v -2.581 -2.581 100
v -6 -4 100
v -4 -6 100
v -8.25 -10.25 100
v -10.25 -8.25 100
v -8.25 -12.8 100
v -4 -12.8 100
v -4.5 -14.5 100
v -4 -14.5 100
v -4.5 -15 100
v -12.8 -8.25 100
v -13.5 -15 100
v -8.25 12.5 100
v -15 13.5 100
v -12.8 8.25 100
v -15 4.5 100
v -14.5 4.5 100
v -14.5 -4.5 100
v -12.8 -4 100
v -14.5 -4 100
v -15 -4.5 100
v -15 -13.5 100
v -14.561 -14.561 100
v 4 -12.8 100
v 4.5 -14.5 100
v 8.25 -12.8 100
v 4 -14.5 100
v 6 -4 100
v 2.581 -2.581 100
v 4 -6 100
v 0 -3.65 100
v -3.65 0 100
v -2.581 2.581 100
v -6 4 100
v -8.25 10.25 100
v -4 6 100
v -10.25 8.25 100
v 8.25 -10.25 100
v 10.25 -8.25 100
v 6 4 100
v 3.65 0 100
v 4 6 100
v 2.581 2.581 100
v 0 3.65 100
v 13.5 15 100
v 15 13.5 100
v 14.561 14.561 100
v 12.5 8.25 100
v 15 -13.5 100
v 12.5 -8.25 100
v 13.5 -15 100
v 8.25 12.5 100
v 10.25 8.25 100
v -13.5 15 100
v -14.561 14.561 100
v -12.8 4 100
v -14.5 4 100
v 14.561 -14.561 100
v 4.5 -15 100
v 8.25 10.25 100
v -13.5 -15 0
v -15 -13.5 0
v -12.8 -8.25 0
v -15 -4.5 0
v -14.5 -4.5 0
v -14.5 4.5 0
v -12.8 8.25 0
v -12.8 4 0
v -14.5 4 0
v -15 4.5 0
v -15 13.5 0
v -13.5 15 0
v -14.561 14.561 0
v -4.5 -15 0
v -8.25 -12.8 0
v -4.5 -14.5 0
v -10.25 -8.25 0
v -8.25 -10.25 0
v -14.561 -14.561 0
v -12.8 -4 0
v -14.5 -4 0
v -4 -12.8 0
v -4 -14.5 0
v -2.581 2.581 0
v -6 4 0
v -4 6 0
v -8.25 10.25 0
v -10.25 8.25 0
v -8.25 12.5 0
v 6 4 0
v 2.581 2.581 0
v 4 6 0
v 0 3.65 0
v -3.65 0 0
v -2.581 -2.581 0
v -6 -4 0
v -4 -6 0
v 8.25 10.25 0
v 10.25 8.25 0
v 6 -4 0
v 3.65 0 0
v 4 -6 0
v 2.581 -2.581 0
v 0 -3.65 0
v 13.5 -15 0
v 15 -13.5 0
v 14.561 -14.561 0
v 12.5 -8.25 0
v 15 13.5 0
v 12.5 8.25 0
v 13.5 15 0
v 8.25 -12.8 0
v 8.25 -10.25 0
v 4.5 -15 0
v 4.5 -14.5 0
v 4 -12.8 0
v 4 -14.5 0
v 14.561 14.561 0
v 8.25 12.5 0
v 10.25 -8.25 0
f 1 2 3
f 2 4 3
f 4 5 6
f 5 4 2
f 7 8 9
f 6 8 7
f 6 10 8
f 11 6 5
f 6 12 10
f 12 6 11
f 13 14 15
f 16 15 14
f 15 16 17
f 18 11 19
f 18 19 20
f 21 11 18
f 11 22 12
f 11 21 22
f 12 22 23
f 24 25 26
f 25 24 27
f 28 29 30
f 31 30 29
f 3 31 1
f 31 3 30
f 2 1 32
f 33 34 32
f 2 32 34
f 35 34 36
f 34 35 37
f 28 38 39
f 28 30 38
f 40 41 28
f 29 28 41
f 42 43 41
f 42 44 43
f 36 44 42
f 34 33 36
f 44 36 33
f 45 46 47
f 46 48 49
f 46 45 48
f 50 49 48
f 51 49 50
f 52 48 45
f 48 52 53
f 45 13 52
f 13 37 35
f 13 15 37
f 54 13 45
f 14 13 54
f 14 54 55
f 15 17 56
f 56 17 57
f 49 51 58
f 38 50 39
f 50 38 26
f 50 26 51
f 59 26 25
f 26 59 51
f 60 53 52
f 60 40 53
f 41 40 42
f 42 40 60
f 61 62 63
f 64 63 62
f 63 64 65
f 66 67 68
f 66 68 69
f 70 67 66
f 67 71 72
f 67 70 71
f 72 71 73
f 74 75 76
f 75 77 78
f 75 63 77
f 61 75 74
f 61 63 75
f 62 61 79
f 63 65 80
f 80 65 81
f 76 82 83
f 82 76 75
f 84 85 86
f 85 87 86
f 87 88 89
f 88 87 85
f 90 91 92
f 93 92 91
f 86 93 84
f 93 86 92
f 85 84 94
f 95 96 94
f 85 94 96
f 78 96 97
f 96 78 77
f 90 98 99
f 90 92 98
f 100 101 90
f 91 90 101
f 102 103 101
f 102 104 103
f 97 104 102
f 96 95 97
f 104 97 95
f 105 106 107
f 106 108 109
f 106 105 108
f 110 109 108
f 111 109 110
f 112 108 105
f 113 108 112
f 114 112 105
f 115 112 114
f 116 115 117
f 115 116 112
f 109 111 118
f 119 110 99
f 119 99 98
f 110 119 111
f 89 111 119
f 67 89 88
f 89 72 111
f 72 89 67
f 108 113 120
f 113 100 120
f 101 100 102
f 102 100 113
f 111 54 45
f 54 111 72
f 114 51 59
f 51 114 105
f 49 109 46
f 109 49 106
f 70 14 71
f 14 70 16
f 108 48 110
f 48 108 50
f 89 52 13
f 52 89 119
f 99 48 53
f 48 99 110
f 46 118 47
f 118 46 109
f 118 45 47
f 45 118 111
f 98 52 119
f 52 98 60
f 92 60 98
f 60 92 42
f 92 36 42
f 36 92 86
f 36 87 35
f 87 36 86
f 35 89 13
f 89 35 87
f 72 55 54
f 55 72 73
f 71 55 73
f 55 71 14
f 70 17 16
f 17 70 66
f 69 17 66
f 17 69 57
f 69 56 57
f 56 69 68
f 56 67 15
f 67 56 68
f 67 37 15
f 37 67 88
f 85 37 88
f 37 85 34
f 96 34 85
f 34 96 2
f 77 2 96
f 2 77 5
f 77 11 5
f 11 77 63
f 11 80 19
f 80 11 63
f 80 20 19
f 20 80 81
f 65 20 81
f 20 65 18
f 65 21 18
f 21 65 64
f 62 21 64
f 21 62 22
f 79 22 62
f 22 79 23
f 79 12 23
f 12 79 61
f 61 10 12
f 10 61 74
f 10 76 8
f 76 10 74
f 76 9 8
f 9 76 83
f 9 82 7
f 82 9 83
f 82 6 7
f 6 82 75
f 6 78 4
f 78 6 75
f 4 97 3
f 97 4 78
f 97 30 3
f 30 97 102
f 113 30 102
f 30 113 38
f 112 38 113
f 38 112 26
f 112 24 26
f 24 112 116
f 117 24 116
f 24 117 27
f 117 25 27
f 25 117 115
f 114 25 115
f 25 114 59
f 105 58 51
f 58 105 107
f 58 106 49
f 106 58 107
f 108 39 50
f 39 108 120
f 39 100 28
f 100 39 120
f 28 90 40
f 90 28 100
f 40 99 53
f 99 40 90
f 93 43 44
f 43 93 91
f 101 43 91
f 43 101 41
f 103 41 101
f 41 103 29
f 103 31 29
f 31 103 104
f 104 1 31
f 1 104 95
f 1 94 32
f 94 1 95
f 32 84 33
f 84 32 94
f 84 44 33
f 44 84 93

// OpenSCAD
// Aleksandr Saechnikov 09 june 2015
ALU_profile(height=100, size=30);

module ALU_profile(size=30, height=10, radius=1.5, step=0.5) {

	linear_extrude(height=height) {
		union() {
			sub_extrusion_profile(size, radius, step);
			rotate([0,0,90])  sub_extrusion_profile(size, radius, step);
			rotate([0,0,180]) sub_extrusion_profile(size, radius, step);
			rotate([0,0,270]) sub_extrusion_profile(size, radius, step);
		}
	}
    difference() {
        union() {
            translate([0, 0, height/2])
                cube([size-radius*2, size, height], center=true);

            translate([0, 0, height/2])
                cube([size, size-radius*2, height], center=true);
        }
            translate([-2.5, -2.5, height/2])
                cube([size, size, height], center=true);
            
        }
    
    module sub_extrusion_profile(size=30, radius = 1.5, step=0.5) {

        reSize = size/30; // Scalling

        k0 = 0;
        k2 = 3.65*reSize;
        k1 = k2*cos(45);

        k3 = 4*reSize;
        k4 = 6*reSize;
        k5 = 8.25*reSize; k5_2 = k5 + k4 - k3;
        k6 = 12.8*reSize;
        k7 = 15*reSize;

        _radius = radius;// OR  *reSize -- Corner radius
        _step = step;    // OR  *reSize -- Step size

        polygon(points=[
            [k1,k1],[0,k2], // Center hole
            [0,k4],[k3,k4],[k5,k5_2],[k5,k6],[k3,k6],
            [k3,k7-_step],[k3+_step,k7-_step],[k3+_step,k7], //Step
            [k7-_radius,k7],[k7-_radius*(1.-cos(45)),k7-_radius*(1.-cos(45))],[k7,k7-_radius],// Corner
            [k7,k3+_step],[k7-_step,k3+_step],[k7-_step,k3], // Step
            [k6,k3],[k6,k5],[k5_2,k5],[k4,k3],[k4,0],
            [k2,0]  // Center hole
        ]);
    }
}
